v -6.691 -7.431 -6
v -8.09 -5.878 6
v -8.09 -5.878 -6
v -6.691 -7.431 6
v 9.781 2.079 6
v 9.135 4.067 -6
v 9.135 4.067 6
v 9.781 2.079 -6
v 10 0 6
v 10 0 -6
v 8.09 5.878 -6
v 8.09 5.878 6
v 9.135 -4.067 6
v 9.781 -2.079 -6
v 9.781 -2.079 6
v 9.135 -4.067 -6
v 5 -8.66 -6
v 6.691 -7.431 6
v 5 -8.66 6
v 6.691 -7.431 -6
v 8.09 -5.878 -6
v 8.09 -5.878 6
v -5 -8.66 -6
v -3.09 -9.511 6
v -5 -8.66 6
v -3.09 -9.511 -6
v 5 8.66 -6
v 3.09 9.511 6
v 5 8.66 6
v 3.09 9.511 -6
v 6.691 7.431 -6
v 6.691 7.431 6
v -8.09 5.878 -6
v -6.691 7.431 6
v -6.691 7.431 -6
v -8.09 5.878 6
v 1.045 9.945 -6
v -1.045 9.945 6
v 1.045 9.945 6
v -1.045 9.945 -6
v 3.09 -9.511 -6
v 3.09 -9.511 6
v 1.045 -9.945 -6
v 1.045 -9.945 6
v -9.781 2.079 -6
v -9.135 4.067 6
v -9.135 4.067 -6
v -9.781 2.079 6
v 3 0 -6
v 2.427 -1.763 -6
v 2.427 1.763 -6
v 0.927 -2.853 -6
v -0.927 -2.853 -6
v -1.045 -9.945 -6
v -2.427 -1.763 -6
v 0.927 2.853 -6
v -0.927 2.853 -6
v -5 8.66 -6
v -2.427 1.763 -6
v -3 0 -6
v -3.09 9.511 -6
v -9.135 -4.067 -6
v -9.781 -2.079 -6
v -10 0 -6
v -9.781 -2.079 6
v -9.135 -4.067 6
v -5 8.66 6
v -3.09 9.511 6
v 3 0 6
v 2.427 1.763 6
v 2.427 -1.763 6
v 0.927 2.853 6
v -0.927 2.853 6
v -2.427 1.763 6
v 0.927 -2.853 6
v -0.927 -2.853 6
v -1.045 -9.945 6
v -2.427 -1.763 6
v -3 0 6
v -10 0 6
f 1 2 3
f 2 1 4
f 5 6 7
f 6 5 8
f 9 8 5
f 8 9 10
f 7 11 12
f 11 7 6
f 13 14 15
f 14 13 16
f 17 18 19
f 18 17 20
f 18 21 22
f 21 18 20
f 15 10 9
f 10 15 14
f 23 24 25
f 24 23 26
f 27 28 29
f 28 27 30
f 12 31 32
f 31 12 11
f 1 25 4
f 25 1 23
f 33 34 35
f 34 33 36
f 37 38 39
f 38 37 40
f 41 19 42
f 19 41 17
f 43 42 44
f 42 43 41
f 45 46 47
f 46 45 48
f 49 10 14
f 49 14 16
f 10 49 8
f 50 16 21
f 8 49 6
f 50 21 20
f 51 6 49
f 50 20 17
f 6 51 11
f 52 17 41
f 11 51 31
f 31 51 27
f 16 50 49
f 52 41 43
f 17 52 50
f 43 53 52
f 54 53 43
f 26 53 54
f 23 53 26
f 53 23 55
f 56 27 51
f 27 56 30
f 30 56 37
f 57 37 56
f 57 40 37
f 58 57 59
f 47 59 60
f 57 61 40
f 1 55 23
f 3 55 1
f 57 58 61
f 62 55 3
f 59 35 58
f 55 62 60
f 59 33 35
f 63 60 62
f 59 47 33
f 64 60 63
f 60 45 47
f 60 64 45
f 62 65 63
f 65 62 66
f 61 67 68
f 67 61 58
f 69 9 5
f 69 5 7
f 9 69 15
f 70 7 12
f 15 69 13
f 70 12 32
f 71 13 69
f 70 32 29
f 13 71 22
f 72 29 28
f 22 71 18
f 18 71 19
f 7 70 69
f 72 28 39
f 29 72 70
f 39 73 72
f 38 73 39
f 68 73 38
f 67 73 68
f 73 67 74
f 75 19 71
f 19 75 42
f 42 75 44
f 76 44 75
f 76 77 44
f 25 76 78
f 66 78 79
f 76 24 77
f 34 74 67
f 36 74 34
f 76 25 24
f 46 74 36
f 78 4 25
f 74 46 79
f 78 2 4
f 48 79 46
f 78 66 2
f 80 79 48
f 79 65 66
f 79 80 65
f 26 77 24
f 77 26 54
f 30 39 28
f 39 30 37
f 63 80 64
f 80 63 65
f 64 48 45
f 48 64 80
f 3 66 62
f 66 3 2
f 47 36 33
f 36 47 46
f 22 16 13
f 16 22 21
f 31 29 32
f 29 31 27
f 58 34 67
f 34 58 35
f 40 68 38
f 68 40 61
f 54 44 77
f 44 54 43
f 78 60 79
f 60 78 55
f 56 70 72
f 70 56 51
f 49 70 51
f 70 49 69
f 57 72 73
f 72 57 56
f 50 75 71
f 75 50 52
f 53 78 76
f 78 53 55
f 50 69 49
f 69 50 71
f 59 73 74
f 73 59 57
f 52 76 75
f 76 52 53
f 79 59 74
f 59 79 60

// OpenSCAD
// Cylindrical spacer with 6 mm inner hole
difference() {
    cylinder(h = 12, d = 20, center = true);  // main spacer body
    translate([0, 0, 0])                        // central 6 mm bore
        cylinder(h = 13, d = 6, center = true);   // remove material for 6 mm hole
}
